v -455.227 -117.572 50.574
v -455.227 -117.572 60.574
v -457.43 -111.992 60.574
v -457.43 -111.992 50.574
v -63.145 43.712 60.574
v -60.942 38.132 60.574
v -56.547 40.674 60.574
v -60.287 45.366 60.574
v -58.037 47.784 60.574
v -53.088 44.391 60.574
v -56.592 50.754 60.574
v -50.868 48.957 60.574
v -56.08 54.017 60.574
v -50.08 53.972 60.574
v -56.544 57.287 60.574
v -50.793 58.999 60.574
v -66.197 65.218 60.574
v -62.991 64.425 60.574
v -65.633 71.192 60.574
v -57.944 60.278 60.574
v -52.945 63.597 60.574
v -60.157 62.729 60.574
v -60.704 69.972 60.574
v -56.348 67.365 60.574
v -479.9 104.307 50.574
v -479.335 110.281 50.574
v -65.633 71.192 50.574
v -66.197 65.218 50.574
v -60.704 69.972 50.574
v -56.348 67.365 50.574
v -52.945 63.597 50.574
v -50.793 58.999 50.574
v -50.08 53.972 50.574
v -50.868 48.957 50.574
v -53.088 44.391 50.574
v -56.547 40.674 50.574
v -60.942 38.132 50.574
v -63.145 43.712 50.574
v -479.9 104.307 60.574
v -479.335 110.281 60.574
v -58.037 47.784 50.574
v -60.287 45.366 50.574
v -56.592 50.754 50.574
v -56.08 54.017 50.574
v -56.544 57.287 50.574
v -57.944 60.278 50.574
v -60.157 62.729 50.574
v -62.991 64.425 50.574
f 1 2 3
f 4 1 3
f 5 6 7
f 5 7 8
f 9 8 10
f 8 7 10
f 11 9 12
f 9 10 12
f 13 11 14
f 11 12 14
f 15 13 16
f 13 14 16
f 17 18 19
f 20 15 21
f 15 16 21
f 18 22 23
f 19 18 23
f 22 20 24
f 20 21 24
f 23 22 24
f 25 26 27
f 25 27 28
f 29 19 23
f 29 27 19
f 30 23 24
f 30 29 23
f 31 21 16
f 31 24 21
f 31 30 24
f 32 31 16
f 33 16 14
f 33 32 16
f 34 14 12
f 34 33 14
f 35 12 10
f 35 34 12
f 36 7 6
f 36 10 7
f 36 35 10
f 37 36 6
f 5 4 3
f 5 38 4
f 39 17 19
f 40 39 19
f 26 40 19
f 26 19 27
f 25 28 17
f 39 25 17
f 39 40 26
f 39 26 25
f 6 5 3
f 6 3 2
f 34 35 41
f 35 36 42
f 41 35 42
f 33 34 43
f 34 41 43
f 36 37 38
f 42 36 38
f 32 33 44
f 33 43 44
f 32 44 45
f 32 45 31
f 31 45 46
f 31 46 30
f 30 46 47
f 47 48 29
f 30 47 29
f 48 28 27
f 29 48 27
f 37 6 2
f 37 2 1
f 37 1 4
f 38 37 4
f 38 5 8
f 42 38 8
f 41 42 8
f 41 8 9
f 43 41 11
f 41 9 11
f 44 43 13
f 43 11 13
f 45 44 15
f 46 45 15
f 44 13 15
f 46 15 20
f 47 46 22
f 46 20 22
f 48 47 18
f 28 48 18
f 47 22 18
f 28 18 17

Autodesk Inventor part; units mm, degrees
ref_plane "YZ Plane" through (0, 0, 0) normal (1, 0, 0) x (0, 1, 0)
ref_plane "XZ Plane" through (0, 0, 0) normal (0, 1, 0) x (-1, 0, 0)
ref_plane "XY Plane" through (0, 0, 0) normal (0, 0, 1) x (1, 0, 0)
ref_plane "Work Plane1" through (-50.9507, 50.6889, 57.5) normal (0, 0, 1) x (-0.2048689, -0.9787894, 0)
sketch "Sketch1" plane through (-50.9507, 50.6889, 57.5) normal (0, 0, 1) x (-0.2048689, -0.9787894, 0)
  arc A0 (13.9049, -7.4915) -> (-16.5454, -18.513) centre (0, -16.65) ccw
  circle A1 centre (79.9079, -408.7425) radius 3.175 projected
  circle A2 centre (121.7651, -356.8432) radius 3.175 projected
  circle A3 centre (187.6397, -367.1429) radius 3.175 projected
  circle A4 centre (211.6572, -429.3419) radius 3.175 projected
  circle A5 centre (169.8001, -481.2412) radius 3.175 projected
  circle A6 centre (103.9254, -470.9415) radius 3.175 projected
  circle A7 centre (66.2341, -383.8137) radius 9.5 projected
  circle A8 centre (136.5171, -332.537) radius 9.5 projected
  circle A9 centre (216.0656, -367.7655) radius 9.5 projected
  circle A10 centre (225.331, -454.2707) radius 9.5 projected
  circle A11 centre (155.048, -505.5474) radius 9.5 projected
  circle A12 centre (75.4996, -470.3189) radius 9.5 projected
  circle A13 centre (59.2774, -428.3076) radius 9.5 projected
  circle A14 centre (110.5541, -498.5906) radius 9.5 projected
  circle A15 centre (197.0593, -489.3252) radius 9.5 projected
  circle A16 centre (232.2878, -409.7768) radius 9.5 projected
  circle A17 centre (181.0111, -339.4938) radius 9.5 projected
  circle A18 centre (94.5059, -348.7592) radius 9.5 projected
  circle A19 centre (145.7826, -419.0422) radius 58 projected
  arc A20 (29.4913, -426.0124) -> (29.2993, -421.0163) centre (29.3729, -423.5152) ccw projected
  arc A21 (29.4913, -426.0124) -> (29.7056, -428.9608) centre (145.7826, -419.0422) ccw projected
  arc A22 (30.238, -433.9322) -> (29.7056, -428.9608) centre (29.9496, -431.4489) ccw projected
  arc A23 (30.238, -433.9322) -> (30.653, -436.8591) centre (145.7826, -419.0422) ccw projected
  arc A24 (31.5235, -441.7825) -> (30.653, -436.8591) centre (31.0663, -439.3247) ccw projected
  arc A25 (31.5235, -441.7825) -> (32.1373, -444.6743) centre (145.7826, -419.0422) ccw projected
  arc A26 (33.3417, -449.5268) -> (32.1373, -444.6743) centre (32.7178, -447.1059) ccw projected
  arc A27 (33.3417, -449.5268) -> (34.1514, -452.3699) centre (145.7826, -419.0422) ccw projected
  arc A28 (35.6842, -457.129) -> (34.1514, -452.3699) centre (34.8965, -454.7563) ccw projected
  arc A29 (35.6842, -457.129) -> (36.686, -459.9102) centre (145.7826, -419.0422) ccw projected
  arc A30 (38.54, -464.5536) -> (36.686, -459.9102) centre (37.5922, -462.2402) ccw projected
  arc A31 (38.54, -464.5536) -> (39.7293, -467.26) centre (145.7826, -419.0422) ccw projected
  arc A32 (41.8958, -471.766) -> (39.7293, -467.26) centre (40.7924, -469.5227) ccw projected
  arc A33 (41.8958, -471.766) -> (43.267, -474.3849) centre (145.7826, -419.0422) ccw projected
  arc A34 (45.736, -478.7325) -> (43.267, -474.3849) centre (44.4821, -476.5698) ccw projected
  arc A35 (45.736, -478.7325) -> (47.2827, -481.2518) centre (145.7826, -419.0422) ccw projected
  arc A36 (50.0427, -485.4208) -> (47.2827, -481.2518) centre (48.644, -483.3486) ccw projected
  arc A37 (50.0427, -485.4208) -> (51.7577, -487.8286) centre (145.7826, -419.0422) ccw projected
  arc A38 (54.7957, -491.7996) -> (51.7577, -487.8286) centre (53.2589, -489.8277) ccw projected
  arc A39 (54.7957, -491.7996) -> (56.671, -494.0847) centre (145.7826, -419.0422) ccw projected
  arc A40 (59.9729, -497.8391) -> (56.671, -494.0847) centre (58.3052, -495.9767) ccw projected
  arc A41 (59.9729, -497.8391) -> (61.9999, -499.991) centre (145.7826, -419.0422) ccw projected
  arc A42 (65.5503, -503.5113) -> (61.9999, -499.991) centre (63.7593, -501.767) ccw projected
  arc A43 (65.5503, -503.5113) -> (67.7193, -505.5198) centre (145.7826, -419.0422) ccw projected
  arc A44 (71.5017, -508.7896) -> (67.7193, -505.5198) centre (69.5959, -507.1716) ccw projected
  arc A45 (71.5017, -508.7896) -> (73.8027, -510.6454) centre (145.7826, -419.0422) ccw projected
  arc A46 (77.7994, -513.6495) -> (73.8027, -510.6454) centre (75.7876, -512.1654) ccw projected
  arc A47 (77.7994, -513.6495) -> (80.2218, -515.344) centre (145.7826, -419.0422) ccw projected
  arc A48 (84.4141, -518.0683) -> (80.2218, -515.344) centre (82.3058, -516.7249) ccw projected
  arc A49 (84.4141, -518.0683) -> (86.9465, -519.5935) centre (145.7826, -419.0422) ccw projected
  arc A50 (91.315, -522.0254) -> (86.9465, -519.5935) centre (89.1198, -520.829) ccw projected
  arc A51 (91.315, -522.0254) -> (93.9455, -523.3742) centre (145.7826, -419.0422) ccw projected
  arc A52 (98.4698, -525.5023) -> (93.9455, -523.3742) centre (96.1981, -524.4585) ccw projected
  arc A53 (98.4698, -525.5023) -> (101.1862, -526.6685) centre (145.7826, -419.0422) ccw projected
  arc A54 (105.8452, -528.4828) -> (101.1862, -526.6685) centre (103.5076, -527.5965) ccw projected
  arc A55 (105.8452, -528.4828) -> (108.6348, -529.4609) centre (145.7826, -419.0422) ccw projected
  arc A56 (113.4068, -530.9531) -> (108.6348, -529.4609) centre (111.0141, -530.2284) ccw projected
  arc A57 (113.4068, -530.9531) -> (116.2567, -531.7386) centre (145.7826, -419.0422) ccw projected
  arc A58 (121.1193, -532.9016) -> (116.2567, -531.7386) centre (118.6828, -532.3419) ccw projected
  arc A59 (121.1193, -532.9016) -> (124.0162, -533.4908) centre (145.7826, -419.0422) ccw projected
  arc A60 (128.9469, -534.3193) -> (124.0162, -533.4908) centre (126.4778, -533.9271) ccw projected
  arc A61 (128.9469, -534.3193) -> (131.8772, -534.7093) centre (145.7826, -419.0422) ccw projected
  arc A62 (136.8529, -535.1995) -> (131.8772, -534.7093) centre (134.3628, -534.9767) ccw projected
  arc A63 (136.8529, -535.1995) -> (139.803, -535.3886) centre (145.7826, -419.0422) ccw projected
  arc A64 (144.8006, -535.5381) -> (139.803, -535.3886) centre (142.3011, -535.4857) ccw projected
  arc A65 (144.8006, -535.5381) -> (147.7567, -535.5255) centre (145.7826, -419.0422) ccw projected
  arc A66 (152.7528, -535.3335) -> (147.7567, -535.5255) centre (150.2556, -535.4518) ccw projected
  arc A67 (152.7528, -535.3335) -> (155.7012, -535.1192) centre (145.7826, -419.0422) ccw projected
  arc A68 (160.6726, -534.5867) -> (155.7012, -535.1192) centre (158.1893, -534.8752) ccw projected
  arc A69 (160.6726, -534.5867) -> (163.5995, -534.1717) centre (145.7826, -419.0422) ccw projected
  arc A70 (168.5229, -533.3012) -> (163.5995, -534.1717) centre (166.0651, -533.7585) ccw projected
  arc A71 (168.5229, -533.3012) -> (171.4146, -532.6875) centre (145.7826, -419.0422) ccw projected
  arc A72 (176.2672, -531.483) -> (171.4146, -532.6875) centre (173.8463, -532.107) ccw projected
  arc A73 (176.2672, -531.483) -> (179.1103, -530.6733) centre (145.7826, -419.0422) ccw projected
  arc A74 (183.8694, -529.1405) -> (179.1103, -530.6733) centre (181.4967, -529.9282) ccw projected
  arc A75 (183.8694, -529.1405) -> (186.6506, -528.1387) centre (145.7826, -419.0422) ccw projected
  arc A76 (191.2939, -526.2847) -> (186.6506, -528.1387) centre (188.9806, -527.2325) ccw projected
  arc A77 (191.2939, -526.2847) -> (194.0003, -525.0955) centre (145.7826, -419.0422) ccw projected
  arc A78 (198.5063, -522.9289) -> (194.0003, -525.0955) centre (196.263, -524.0324) ccw projected
  arc A79 (198.5063, -522.9289) -> (201.1253, -521.5577) centre (145.7826, -419.0422) ccw projected
  arc A80 (205.4729, -519.0888) -> (201.1253, -521.5577) centre (203.3101, -520.3427) ccw projected
  arc A81 (205.4729, -519.0888) -> (207.9921, -517.542) centre (145.7826, -419.0422) ccw projected
  arc A82 (212.1612, -514.7821) -> (207.9921, -517.542) centre (210.089, -516.1807) ccw projected
  arc A83 (212.1612, -514.7821) -> (214.569, -513.0671) centre (145.7826, -419.0422) ccw projected
  arc A84 (218.54, -510.0291) -> (214.569, -513.0671) centre (216.5681, -511.5658) ccw projected
  arc A85 (218.54, -510.0291) -> (220.8251, -508.1537) centre (145.7826, -419.0422) ccw projected
  arc A86 (224.5795, -504.8518) -> (220.8251, -508.1537) centre (222.7171, -506.5196) ccw projected
  arc A87 (224.5795, -504.8518) -> (226.7314, -502.8249) centre (145.7826, -419.0422) ccw projected
  arc A88 (230.2517, -499.2745) -> (226.7314, -502.8249) centre (228.5074, -501.0655) ccw projected
  arc A89 (230.2517, -499.2745) -> (232.2602, -497.1055) centre (145.7826, -419.0422) ccw projected
  arc A90 (235.53, -493.3231) -> (232.2602, -497.1055) centre (233.912, -495.2289) ccw projected
  arc A91 (235.53, -493.3231) -> (237.3858, -491.022) centre (145.7826, -419.0422) ccw projected
  arc A92 (240.3899, -487.0253) -> (237.3858, -491.022) centre (238.9057, -489.0371) ccw projected
  arc A93 (240.3899, -487.0253) -> (242.0843, -484.603) centre (145.7826, -419.0422) ccw projected
  arc A94 (244.8087, -480.4106) -> (242.0843, -484.603) centre (243.4653, -482.519) ccw projected
  arc A95 (244.8087, -480.4106) -> (246.3339, -477.8783) centre (145.7826, -419.0422) ccw projected
  arc A96 (248.7657, -473.5098) -> (246.3339, -477.8783) centre (247.5693, -475.7049) ccw projected
  arc A97 (248.7657, -473.5098) -> (250.1146, -470.8793) centre (145.7826, -419.0422) ccw projected
  arc A98 (252.2427, -466.355) -> (250.1146, -470.8793) centre (251.1989, -468.6266) ccw projected
  arc A99 (252.2427, -466.355) -> (253.4088, -463.6386) centre (145.7826, -419.0422) ccw projected
  arc A100 (255.2232, -458.9796) -> (253.4088, -463.6386) centre (254.3369, -461.3172) ccw projected
  arc A101 (255.2232, -458.9796) -> (256.2013, -456.1899) centre (145.7826, -419.0422) ccw projected
  arc A102 (257.6935, -451.418) -> (256.2013, -456.1899) centre (256.9688, -453.8106) ccw projected
  arc A103 (257.6935, -451.418) -> (258.4789, -448.5681) centre (145.7826, -419.0422) ccw projected
  arc A104 (259.642, -443.7054) -> (258.4789, -448.5681) centre (259.0822, -446.142) ccw projected
  arc A105 (259.642, -443.7054) -> (260.2311, -440.8086) centre (145.7826, -419.0422) ccw projected
  arc A106 (261.0597, -435.8779) -> (260.2311, -440.8086) centre (260.6675, -438.3469) ccw projected
  arc A107 (261.0597, -435.8779) -> (261.4497, -432.9476) centre (145.7826, -419.0422) ccw projected
  arc A108 (261.9398, -427.9719) -> (261.4497, -432.9476) centre (261.717, -430.4619) ccw projected
  arc A109 (261.9398, -427.9719) -> (262.129, -425.0218) centre (145.7826, -419.0422) ccw projected
  arc A110 (262.2784, -420.0242) -> (262.129, -425.0218) centre (262.2261, -422.5236) ccw projected
  arc A111 (262.2784, -420.0242) -> (262.2658, -417.0681) centre (145.7826, -419.0422) ccw projected
  arc A112 (262.0739, -412.0719) -> (262.2658, -417.0681) centre (262.1922, -414.5691) ccw projected
  arc A113 (262.0739, -412.0719) -> (261.8596, -409.1236) centre (145.7826, -419.0422) ccw projected
  arc A114 (261.3271, -404.1522) -> (261.8596, -409.1236) centre (261.6156, -406.6355) ccw projected
  arc A115 (261.3271, -404.1522) -> (260.9121, -401.2253) centre (145.7826, -419.0422) ccw projected
  arc A116 (260.0416, -396.3019) -> (260.9121, -401.2253) centre (260.4989, -398.7597) ccw projected
  arc A117 (260.0416, -396.3019) -> (259.4278, -393.4101) centre (145.7826, -419.0422) ccw projected
  arc A118 (258.2234, -388.5576) -> (259.4278, -393.4101) centre (258.8473, -390.9785) ccw projected
  arc A119 (258.2234, -388.5576) -> (257.4137, -385.7145) centre (145.7826, -419.0422) ccw projected
  arc A120 (255.8809, -380.9554) -> (257.4137, -385.7145) centre (256.6686, -383.3281) ccw projected
  arc A121 (255.8809, -380.9554) -> (254.8791, -378.1742) centre (145.7826, -419.0422) ccw projected
  arc A122 (253.0251, -373.5308) -> (254.8791, -378.1742) centre (253.9729, -375.8442) ccw projected
  arc A123 (253.0251, -373.5308) -> (251.8358, -370.8244) centre (145.7826, -419.0422) ccw projected
  arc A124 (249.6693, -366.3184) -> (251.8358, -370.8244) centre (250.7727, -368.5617) ccw projected
  arc A125 (249.6693, -366.3184) -> (248.2981, -363.6995) centre (145.7826, -419.0422) ccw projected
  arc A126 (245.8291, -359.3519) -> (248.2981, -363.6995) centre (247.0831, -361.5146) ccw projected
  arc A127 (245.8291, -359.3519) -> (244.2824, -356.8326) centre (145.7826, -419.0422) ccw projected
  arc A128 (241.5225, -352.6636) -> (244.2824, -356.8326) centre (242.9211, -354.7358) ccw projected
  arc A129 (241.5225, -352.6636) -> (239.8075, -350.2558) centre (145.7826, -419.0422) ccw projected
  arc A130 (236.7695, -346.2848) -> (239.8075, -350.2558) centre (238.3062, -348.2567) ccw projected
  arc A131 (236.7695, -346.2848) -> (234.8941, -343.9996) centre (145.7826, -419.0422) ccw projected
  arc A132 (231.5922, -340.2453) -> (234.8941, -343.9996) centre (233.26, -342.1077) ccw projected
  arc A133 (231.5922, -340.2453) -> (229.5653, -338.0934) centre (145.7826, -419.0422) ccw projected
  arc A134 (226.0149, -334.5731) -> (229.5653, -338.0934) centre (227.8058, -336.3174) ccw projected
  arc A135 (226.0149, -334.5731) -> (223.8458, -332.5646) centre (145.7826, -419.0422) ccw projected
  arc A136 (220.0635, -329.2948) -> (223.8458, -332.5646) centre (221.9693, -330.9127) ccw projected
  arc A137 (220.0635, -329.2948) -> (217.7624, -327.439) centre (145.7826, -419.0422) ccw projected
  arc A138 (213.7657, -324.4349) -> (217.7624, -327.439) centre (215.7775, -325.919) ccw projected
  arc A139 (213.7657, -324.4349) -> (211.3434, -322.7404) centre (145.7826, -419.0422) ccw projected
  arc A140 (207.151, -320.0161) -> (211.3434, -322.7404) centre (209.2594, -321.3595) ccw projected
  arc A141 (207.151, -320.0161) -> (204.6187, -318.4909) centre (145.7826, -419.0422) ccw projected
  arc A142 (200.2501, -316.059) -> (204.6187, -318.4909) centre (202.4453, -317.2554) ccw projected
  arc A143 (200.2501, -316.059) -> (197.6196, -314.7102) centre (145.7826, -419.0422) ccw projected
  arc A144 (193.0953, -312.5821) -> (197.6196, -314.7102) centre (195.367, -313.6259) ccw projected
  arc A145 (193.0953, -312.5821) -> (190.3789, -311.4159) centre (145.7826, -419.0422) ccw projected
  arc A146 (185.72, -309.6015) -> (190.3789, -311.4159) centre (188.0576, -310.4879) ccw projected
  arc A147 (185.72, -309.6015) -> (182.9303, -308.6235) centre (145.7826, -419.0422) ccw projected
  arc A148 (178.1584, -307.1313) -> (182.9303, -308.6235) centre (180.551, -307.856) ccw projected
  arc A149 (178.1584, -307.1313) -> (175.3085, -306.3458) centre (145.7826, -419.0422) ccw projected
  arc A150 (170.4458, -305.1827) -> (175.3085, -306.3458) centre (172.8823, -305.7425) ccw projected
  arc A151 (170.4458, -305.1827) -> (167.5489, -304.5936) centre (145.7826, -419.0422) ccw projected
  arc A152 (162.6183, -303.7651) -> (167.5489, -304.5936) centre (165.0873, -304.1573) ccw projected
  arc A153 (162.6183, -303.7651) -> (159.688, -303.375) centre (145.7826, -419.0422) ccw projected
  arc A154 (154.7122, -302.8849) -> (159.688, -303.375) centre (157.2023, -303.1077) ccw projected
  arc A155 (154.7122, -302.8849) -> (151.7621, -302.6958) centre (145.7826, -419.0422) ccw projected
  arc A156 (146.7646, -302.5463) -> (151.7621, -302.6958) centre (149.264, -302.5987) ccw projected
  arc A157 (146.7646, -302.5463) -> (143.8084, -302.5589) centre (145.7826, -419.0422) ccw projected
  arc A158 (138.8123, -302.7509) -> (143.8084, -302.5589) centre (141.3095, -302.6326) ccw projected
  arc A159 (138.8123, -302.7509) -> (135.8639, -302.9652) centre (145.7826, -419.0422) ccw projected
  arc A160 (130.8926, -303.4977) -> (135.8639, -302.9652) centre (133.3759, -303.2092) ccw projected
  arc A161 (130.8926, -303.4977) -> (127.9657, -303.9127) centre (145.7826, -419.0422) ccw projected
  arc A162 (123.0422, -304.7832) -> (127.9657, -303.9127) centre (125.5001, -304.3259) ccw projected
  arc A163 (123.0422, -304.7832) -> (120.1505, -305.3969) centre (145.7826, -419.0422) ccw projected
  arc A164 (115.2979, -306.6014) -> (120.1505, -305.3969) centre (117.7188, -305.9774) ccw projected
  arc A165 (115.2979, -306.6014) -> (112.4548, -307.4111) centre (145.7826, -419.0422) ccw projected
  arc A166 (107.6958, -308.9438) -> (112.4548, -307.4111) centre (110.0684, -308.1562) ccw projected
  arc A167 (107.6958, -308.9438) -> (104.9145, -309.9457) centre (145.7826, -419.0422) ccw projected
  arc A168 (100.2712, -311.7996) -> (104.9145, -309.9457) centre (102.5846, -310.8519) ccw projected
  arc A169 (100.2712, -311.7996) -> (97.5648, -312.9889) centre (145.7826, -419.0422) ccw projected
  arc A170 (93.0588, -315.1555) -> (97.5648, -312.9889) centre (95.3021, -314.052) ccw projected
  arc A171 (93.0588, -315.1555) -> (90.4399, -316.5266) centre (145.7826, -419.0422) ccw projected
  arc A172 (86.0922, -318.9956) -> (90.4399, -316.5266) centre (88.255, -317.7417) ccw projected
  arc A173 (86.0922, -318.9956) -> (83.573, -320.5424) centre (145.7826, -419.0422) ccw projected
  arc A174 (79.404, -323.3023) -> (83.573, -320.5424) centre (81.4761, -321.9037) ccw projected
  arc A175 (79.404, -323.3023) -> (76.9961, -325.0173) centre (145.7826, -419.0422) ccw projected
  arc A176 (73.0252, -328.0553) -> (76.9961, -325.0173) centre (74.9971, -326.5185) ccw projected
  arc A177 (73.0252, -328.0553) -> (70.74, -329.9307) centre (145.7826, -419.0422) ccw projected
  arc A178 (66.9856, -333.2326) -> (70.74, -329.9307) centre (68.8481, -331.5648) ccw projected
  arc A179 (66.9856, -333.2326) -> (64.8338, -335.2595) centre (145.7826, -419.0422) ccw projected
  arc A180 (61.3135, -338.8099) -> (64.8338, -335.2595) centre (63.0577, -337.0189) ccw projected
  arc A181 (61.3135, -338.8099) -> (59.305, -340.9789) centre (145.7826, -419.0422) ccw projected
  arc A182 (56.0351, -344.7613) -> (59.305, -340.9789) centre (57.6531, -342.8555) ccw projected
  arc A183 (56.0351, -344.7613) -> (54.1793, -347.0624) centre (145.7826, -419.0422) ccw projected
  arc A184 (51.1753, -351.0591) -> (54.1793, -347.0624) centre (52.6594, -349.0473) ccw projected
  arc A185 (51.1753, -351.0591) -> (49.4808, -353.4814) centre (145.7826, -419.0422) ccw projected
  arc A186 (46.7565, -357.6738) -> (49.4808, -353.4814) centre (48.0999, -355.5654) ccw projected
  arc A187 (46.7565, -357.6738) -> (45.2313, -360.2061) centre (145.7826, -419.0422) ccw projected
  arc A188 (42.7994, -364.5746) -> (45.2313, -360.2061) centre (43.9958, -362.3795) ccw projected
  arc A189 (42.7994, -364.5746) -> (41.4506, -367.2051) centre (145.7826, -419.0422) ccw projected
  arc A190 (39.3225, -371.7294) -> (41.4506, -367.2051) centre (40.3663, -369.4577) ccw projected
  arc A191 (39.3225, -371.7294) -> (38.1563, -374.4458) centre (145.7826, -419.0422) ccw projected
  arc A192 (36.3419, -379.1048) -> (38.1563, -374.4458) centre (37.2283, -376.7672) ccw projected
  arc A193 (36.3419, -379.1048) -> (35.3638, -381.8945) centre (145.7826, -419.0422) ccw projected
  arc A194 (33.8716, -386.6664) -> (35.3638, -381.8945) centre (34.5964, -384.2738) ccw projected
  arc A195 (33.8716, -386.6664) -> (33.0862, -389.5163) centre (145.7826, -419.0422) ccw projected
  arc A196 (31.9231, -394.3789) -> (33.0862, -389.5163) centre (32.4829, -391.9424) ccw projected
  arc A197 (31.9231, -394.3789) -> (31.334, -397.2758) centre (145.7826, -419.0422) ccw projected
  arc A198 (30.5055, -402.2065) -> (31.334, -397.2758) centre (30.8977, -399.7374) ccw projected
  arc A199 (30.5055, -402.2065) -> (30.1154, -405.1368) centre (145.7826, -419.0422) ccw projected
  arc A200 (29.6253, -410.1125) -> (30.1154, -405.1368) centre (29.8481, -407.6225) ccw projected
  arc A201 (29.6253, -410.1125) -> (29.4361, -413.0626) centre (145.7826, -419.0422) ccw projected
  arc A202 (29.2867, -418.0602) -> (29.4361, -413.0626) centre (29.3391, -415.5607) ccw projected
  arc A203 (29.2867, -418.0602) -> (29.2993, -421.0163) centre (145.7826, -419.0422) ccw projected
  line L0 (-16.5454, -18.513) -> (29.9496, -431.4489)
  line L1 (13.9049, -7.4915) -> (247.0831, -361.5146)
  point P0 (39.1755, 60.2546)
ref_plane "Work Plane2" through (-479.3841, 109.765, 57.5) normal (-0.9955659, 0.0940665, 0) x (-0.0940665, -0.9955659, 0)
sketch "Sketch2" plane through (-479.3841, 109.765, 57.5) normal (-0.9955659, 0.0940665, 0) x (-0.0940665, -0.9955659, 0)
  line L0 (-0.5181, 3.0742) -> (5.4819, 3.0742)
  line L1 (5.4819, 3.0742) -> (5.4819, -6.9258)
  line L2 (5.4819, -6.9258) -> (-0.5181, -6.9258)
  line L3 (-0.5181, -6.9258) -> (-0.5181, 3.0742)
  point P0 (64.1843, -57.5)
  dimension "d2" = 10
  dimension "d3" = 6
sweep "Sweep1" add profiles "Sketch2" path "Sketch1" path curves L0 A0 L1
properties part number "cadena2"
